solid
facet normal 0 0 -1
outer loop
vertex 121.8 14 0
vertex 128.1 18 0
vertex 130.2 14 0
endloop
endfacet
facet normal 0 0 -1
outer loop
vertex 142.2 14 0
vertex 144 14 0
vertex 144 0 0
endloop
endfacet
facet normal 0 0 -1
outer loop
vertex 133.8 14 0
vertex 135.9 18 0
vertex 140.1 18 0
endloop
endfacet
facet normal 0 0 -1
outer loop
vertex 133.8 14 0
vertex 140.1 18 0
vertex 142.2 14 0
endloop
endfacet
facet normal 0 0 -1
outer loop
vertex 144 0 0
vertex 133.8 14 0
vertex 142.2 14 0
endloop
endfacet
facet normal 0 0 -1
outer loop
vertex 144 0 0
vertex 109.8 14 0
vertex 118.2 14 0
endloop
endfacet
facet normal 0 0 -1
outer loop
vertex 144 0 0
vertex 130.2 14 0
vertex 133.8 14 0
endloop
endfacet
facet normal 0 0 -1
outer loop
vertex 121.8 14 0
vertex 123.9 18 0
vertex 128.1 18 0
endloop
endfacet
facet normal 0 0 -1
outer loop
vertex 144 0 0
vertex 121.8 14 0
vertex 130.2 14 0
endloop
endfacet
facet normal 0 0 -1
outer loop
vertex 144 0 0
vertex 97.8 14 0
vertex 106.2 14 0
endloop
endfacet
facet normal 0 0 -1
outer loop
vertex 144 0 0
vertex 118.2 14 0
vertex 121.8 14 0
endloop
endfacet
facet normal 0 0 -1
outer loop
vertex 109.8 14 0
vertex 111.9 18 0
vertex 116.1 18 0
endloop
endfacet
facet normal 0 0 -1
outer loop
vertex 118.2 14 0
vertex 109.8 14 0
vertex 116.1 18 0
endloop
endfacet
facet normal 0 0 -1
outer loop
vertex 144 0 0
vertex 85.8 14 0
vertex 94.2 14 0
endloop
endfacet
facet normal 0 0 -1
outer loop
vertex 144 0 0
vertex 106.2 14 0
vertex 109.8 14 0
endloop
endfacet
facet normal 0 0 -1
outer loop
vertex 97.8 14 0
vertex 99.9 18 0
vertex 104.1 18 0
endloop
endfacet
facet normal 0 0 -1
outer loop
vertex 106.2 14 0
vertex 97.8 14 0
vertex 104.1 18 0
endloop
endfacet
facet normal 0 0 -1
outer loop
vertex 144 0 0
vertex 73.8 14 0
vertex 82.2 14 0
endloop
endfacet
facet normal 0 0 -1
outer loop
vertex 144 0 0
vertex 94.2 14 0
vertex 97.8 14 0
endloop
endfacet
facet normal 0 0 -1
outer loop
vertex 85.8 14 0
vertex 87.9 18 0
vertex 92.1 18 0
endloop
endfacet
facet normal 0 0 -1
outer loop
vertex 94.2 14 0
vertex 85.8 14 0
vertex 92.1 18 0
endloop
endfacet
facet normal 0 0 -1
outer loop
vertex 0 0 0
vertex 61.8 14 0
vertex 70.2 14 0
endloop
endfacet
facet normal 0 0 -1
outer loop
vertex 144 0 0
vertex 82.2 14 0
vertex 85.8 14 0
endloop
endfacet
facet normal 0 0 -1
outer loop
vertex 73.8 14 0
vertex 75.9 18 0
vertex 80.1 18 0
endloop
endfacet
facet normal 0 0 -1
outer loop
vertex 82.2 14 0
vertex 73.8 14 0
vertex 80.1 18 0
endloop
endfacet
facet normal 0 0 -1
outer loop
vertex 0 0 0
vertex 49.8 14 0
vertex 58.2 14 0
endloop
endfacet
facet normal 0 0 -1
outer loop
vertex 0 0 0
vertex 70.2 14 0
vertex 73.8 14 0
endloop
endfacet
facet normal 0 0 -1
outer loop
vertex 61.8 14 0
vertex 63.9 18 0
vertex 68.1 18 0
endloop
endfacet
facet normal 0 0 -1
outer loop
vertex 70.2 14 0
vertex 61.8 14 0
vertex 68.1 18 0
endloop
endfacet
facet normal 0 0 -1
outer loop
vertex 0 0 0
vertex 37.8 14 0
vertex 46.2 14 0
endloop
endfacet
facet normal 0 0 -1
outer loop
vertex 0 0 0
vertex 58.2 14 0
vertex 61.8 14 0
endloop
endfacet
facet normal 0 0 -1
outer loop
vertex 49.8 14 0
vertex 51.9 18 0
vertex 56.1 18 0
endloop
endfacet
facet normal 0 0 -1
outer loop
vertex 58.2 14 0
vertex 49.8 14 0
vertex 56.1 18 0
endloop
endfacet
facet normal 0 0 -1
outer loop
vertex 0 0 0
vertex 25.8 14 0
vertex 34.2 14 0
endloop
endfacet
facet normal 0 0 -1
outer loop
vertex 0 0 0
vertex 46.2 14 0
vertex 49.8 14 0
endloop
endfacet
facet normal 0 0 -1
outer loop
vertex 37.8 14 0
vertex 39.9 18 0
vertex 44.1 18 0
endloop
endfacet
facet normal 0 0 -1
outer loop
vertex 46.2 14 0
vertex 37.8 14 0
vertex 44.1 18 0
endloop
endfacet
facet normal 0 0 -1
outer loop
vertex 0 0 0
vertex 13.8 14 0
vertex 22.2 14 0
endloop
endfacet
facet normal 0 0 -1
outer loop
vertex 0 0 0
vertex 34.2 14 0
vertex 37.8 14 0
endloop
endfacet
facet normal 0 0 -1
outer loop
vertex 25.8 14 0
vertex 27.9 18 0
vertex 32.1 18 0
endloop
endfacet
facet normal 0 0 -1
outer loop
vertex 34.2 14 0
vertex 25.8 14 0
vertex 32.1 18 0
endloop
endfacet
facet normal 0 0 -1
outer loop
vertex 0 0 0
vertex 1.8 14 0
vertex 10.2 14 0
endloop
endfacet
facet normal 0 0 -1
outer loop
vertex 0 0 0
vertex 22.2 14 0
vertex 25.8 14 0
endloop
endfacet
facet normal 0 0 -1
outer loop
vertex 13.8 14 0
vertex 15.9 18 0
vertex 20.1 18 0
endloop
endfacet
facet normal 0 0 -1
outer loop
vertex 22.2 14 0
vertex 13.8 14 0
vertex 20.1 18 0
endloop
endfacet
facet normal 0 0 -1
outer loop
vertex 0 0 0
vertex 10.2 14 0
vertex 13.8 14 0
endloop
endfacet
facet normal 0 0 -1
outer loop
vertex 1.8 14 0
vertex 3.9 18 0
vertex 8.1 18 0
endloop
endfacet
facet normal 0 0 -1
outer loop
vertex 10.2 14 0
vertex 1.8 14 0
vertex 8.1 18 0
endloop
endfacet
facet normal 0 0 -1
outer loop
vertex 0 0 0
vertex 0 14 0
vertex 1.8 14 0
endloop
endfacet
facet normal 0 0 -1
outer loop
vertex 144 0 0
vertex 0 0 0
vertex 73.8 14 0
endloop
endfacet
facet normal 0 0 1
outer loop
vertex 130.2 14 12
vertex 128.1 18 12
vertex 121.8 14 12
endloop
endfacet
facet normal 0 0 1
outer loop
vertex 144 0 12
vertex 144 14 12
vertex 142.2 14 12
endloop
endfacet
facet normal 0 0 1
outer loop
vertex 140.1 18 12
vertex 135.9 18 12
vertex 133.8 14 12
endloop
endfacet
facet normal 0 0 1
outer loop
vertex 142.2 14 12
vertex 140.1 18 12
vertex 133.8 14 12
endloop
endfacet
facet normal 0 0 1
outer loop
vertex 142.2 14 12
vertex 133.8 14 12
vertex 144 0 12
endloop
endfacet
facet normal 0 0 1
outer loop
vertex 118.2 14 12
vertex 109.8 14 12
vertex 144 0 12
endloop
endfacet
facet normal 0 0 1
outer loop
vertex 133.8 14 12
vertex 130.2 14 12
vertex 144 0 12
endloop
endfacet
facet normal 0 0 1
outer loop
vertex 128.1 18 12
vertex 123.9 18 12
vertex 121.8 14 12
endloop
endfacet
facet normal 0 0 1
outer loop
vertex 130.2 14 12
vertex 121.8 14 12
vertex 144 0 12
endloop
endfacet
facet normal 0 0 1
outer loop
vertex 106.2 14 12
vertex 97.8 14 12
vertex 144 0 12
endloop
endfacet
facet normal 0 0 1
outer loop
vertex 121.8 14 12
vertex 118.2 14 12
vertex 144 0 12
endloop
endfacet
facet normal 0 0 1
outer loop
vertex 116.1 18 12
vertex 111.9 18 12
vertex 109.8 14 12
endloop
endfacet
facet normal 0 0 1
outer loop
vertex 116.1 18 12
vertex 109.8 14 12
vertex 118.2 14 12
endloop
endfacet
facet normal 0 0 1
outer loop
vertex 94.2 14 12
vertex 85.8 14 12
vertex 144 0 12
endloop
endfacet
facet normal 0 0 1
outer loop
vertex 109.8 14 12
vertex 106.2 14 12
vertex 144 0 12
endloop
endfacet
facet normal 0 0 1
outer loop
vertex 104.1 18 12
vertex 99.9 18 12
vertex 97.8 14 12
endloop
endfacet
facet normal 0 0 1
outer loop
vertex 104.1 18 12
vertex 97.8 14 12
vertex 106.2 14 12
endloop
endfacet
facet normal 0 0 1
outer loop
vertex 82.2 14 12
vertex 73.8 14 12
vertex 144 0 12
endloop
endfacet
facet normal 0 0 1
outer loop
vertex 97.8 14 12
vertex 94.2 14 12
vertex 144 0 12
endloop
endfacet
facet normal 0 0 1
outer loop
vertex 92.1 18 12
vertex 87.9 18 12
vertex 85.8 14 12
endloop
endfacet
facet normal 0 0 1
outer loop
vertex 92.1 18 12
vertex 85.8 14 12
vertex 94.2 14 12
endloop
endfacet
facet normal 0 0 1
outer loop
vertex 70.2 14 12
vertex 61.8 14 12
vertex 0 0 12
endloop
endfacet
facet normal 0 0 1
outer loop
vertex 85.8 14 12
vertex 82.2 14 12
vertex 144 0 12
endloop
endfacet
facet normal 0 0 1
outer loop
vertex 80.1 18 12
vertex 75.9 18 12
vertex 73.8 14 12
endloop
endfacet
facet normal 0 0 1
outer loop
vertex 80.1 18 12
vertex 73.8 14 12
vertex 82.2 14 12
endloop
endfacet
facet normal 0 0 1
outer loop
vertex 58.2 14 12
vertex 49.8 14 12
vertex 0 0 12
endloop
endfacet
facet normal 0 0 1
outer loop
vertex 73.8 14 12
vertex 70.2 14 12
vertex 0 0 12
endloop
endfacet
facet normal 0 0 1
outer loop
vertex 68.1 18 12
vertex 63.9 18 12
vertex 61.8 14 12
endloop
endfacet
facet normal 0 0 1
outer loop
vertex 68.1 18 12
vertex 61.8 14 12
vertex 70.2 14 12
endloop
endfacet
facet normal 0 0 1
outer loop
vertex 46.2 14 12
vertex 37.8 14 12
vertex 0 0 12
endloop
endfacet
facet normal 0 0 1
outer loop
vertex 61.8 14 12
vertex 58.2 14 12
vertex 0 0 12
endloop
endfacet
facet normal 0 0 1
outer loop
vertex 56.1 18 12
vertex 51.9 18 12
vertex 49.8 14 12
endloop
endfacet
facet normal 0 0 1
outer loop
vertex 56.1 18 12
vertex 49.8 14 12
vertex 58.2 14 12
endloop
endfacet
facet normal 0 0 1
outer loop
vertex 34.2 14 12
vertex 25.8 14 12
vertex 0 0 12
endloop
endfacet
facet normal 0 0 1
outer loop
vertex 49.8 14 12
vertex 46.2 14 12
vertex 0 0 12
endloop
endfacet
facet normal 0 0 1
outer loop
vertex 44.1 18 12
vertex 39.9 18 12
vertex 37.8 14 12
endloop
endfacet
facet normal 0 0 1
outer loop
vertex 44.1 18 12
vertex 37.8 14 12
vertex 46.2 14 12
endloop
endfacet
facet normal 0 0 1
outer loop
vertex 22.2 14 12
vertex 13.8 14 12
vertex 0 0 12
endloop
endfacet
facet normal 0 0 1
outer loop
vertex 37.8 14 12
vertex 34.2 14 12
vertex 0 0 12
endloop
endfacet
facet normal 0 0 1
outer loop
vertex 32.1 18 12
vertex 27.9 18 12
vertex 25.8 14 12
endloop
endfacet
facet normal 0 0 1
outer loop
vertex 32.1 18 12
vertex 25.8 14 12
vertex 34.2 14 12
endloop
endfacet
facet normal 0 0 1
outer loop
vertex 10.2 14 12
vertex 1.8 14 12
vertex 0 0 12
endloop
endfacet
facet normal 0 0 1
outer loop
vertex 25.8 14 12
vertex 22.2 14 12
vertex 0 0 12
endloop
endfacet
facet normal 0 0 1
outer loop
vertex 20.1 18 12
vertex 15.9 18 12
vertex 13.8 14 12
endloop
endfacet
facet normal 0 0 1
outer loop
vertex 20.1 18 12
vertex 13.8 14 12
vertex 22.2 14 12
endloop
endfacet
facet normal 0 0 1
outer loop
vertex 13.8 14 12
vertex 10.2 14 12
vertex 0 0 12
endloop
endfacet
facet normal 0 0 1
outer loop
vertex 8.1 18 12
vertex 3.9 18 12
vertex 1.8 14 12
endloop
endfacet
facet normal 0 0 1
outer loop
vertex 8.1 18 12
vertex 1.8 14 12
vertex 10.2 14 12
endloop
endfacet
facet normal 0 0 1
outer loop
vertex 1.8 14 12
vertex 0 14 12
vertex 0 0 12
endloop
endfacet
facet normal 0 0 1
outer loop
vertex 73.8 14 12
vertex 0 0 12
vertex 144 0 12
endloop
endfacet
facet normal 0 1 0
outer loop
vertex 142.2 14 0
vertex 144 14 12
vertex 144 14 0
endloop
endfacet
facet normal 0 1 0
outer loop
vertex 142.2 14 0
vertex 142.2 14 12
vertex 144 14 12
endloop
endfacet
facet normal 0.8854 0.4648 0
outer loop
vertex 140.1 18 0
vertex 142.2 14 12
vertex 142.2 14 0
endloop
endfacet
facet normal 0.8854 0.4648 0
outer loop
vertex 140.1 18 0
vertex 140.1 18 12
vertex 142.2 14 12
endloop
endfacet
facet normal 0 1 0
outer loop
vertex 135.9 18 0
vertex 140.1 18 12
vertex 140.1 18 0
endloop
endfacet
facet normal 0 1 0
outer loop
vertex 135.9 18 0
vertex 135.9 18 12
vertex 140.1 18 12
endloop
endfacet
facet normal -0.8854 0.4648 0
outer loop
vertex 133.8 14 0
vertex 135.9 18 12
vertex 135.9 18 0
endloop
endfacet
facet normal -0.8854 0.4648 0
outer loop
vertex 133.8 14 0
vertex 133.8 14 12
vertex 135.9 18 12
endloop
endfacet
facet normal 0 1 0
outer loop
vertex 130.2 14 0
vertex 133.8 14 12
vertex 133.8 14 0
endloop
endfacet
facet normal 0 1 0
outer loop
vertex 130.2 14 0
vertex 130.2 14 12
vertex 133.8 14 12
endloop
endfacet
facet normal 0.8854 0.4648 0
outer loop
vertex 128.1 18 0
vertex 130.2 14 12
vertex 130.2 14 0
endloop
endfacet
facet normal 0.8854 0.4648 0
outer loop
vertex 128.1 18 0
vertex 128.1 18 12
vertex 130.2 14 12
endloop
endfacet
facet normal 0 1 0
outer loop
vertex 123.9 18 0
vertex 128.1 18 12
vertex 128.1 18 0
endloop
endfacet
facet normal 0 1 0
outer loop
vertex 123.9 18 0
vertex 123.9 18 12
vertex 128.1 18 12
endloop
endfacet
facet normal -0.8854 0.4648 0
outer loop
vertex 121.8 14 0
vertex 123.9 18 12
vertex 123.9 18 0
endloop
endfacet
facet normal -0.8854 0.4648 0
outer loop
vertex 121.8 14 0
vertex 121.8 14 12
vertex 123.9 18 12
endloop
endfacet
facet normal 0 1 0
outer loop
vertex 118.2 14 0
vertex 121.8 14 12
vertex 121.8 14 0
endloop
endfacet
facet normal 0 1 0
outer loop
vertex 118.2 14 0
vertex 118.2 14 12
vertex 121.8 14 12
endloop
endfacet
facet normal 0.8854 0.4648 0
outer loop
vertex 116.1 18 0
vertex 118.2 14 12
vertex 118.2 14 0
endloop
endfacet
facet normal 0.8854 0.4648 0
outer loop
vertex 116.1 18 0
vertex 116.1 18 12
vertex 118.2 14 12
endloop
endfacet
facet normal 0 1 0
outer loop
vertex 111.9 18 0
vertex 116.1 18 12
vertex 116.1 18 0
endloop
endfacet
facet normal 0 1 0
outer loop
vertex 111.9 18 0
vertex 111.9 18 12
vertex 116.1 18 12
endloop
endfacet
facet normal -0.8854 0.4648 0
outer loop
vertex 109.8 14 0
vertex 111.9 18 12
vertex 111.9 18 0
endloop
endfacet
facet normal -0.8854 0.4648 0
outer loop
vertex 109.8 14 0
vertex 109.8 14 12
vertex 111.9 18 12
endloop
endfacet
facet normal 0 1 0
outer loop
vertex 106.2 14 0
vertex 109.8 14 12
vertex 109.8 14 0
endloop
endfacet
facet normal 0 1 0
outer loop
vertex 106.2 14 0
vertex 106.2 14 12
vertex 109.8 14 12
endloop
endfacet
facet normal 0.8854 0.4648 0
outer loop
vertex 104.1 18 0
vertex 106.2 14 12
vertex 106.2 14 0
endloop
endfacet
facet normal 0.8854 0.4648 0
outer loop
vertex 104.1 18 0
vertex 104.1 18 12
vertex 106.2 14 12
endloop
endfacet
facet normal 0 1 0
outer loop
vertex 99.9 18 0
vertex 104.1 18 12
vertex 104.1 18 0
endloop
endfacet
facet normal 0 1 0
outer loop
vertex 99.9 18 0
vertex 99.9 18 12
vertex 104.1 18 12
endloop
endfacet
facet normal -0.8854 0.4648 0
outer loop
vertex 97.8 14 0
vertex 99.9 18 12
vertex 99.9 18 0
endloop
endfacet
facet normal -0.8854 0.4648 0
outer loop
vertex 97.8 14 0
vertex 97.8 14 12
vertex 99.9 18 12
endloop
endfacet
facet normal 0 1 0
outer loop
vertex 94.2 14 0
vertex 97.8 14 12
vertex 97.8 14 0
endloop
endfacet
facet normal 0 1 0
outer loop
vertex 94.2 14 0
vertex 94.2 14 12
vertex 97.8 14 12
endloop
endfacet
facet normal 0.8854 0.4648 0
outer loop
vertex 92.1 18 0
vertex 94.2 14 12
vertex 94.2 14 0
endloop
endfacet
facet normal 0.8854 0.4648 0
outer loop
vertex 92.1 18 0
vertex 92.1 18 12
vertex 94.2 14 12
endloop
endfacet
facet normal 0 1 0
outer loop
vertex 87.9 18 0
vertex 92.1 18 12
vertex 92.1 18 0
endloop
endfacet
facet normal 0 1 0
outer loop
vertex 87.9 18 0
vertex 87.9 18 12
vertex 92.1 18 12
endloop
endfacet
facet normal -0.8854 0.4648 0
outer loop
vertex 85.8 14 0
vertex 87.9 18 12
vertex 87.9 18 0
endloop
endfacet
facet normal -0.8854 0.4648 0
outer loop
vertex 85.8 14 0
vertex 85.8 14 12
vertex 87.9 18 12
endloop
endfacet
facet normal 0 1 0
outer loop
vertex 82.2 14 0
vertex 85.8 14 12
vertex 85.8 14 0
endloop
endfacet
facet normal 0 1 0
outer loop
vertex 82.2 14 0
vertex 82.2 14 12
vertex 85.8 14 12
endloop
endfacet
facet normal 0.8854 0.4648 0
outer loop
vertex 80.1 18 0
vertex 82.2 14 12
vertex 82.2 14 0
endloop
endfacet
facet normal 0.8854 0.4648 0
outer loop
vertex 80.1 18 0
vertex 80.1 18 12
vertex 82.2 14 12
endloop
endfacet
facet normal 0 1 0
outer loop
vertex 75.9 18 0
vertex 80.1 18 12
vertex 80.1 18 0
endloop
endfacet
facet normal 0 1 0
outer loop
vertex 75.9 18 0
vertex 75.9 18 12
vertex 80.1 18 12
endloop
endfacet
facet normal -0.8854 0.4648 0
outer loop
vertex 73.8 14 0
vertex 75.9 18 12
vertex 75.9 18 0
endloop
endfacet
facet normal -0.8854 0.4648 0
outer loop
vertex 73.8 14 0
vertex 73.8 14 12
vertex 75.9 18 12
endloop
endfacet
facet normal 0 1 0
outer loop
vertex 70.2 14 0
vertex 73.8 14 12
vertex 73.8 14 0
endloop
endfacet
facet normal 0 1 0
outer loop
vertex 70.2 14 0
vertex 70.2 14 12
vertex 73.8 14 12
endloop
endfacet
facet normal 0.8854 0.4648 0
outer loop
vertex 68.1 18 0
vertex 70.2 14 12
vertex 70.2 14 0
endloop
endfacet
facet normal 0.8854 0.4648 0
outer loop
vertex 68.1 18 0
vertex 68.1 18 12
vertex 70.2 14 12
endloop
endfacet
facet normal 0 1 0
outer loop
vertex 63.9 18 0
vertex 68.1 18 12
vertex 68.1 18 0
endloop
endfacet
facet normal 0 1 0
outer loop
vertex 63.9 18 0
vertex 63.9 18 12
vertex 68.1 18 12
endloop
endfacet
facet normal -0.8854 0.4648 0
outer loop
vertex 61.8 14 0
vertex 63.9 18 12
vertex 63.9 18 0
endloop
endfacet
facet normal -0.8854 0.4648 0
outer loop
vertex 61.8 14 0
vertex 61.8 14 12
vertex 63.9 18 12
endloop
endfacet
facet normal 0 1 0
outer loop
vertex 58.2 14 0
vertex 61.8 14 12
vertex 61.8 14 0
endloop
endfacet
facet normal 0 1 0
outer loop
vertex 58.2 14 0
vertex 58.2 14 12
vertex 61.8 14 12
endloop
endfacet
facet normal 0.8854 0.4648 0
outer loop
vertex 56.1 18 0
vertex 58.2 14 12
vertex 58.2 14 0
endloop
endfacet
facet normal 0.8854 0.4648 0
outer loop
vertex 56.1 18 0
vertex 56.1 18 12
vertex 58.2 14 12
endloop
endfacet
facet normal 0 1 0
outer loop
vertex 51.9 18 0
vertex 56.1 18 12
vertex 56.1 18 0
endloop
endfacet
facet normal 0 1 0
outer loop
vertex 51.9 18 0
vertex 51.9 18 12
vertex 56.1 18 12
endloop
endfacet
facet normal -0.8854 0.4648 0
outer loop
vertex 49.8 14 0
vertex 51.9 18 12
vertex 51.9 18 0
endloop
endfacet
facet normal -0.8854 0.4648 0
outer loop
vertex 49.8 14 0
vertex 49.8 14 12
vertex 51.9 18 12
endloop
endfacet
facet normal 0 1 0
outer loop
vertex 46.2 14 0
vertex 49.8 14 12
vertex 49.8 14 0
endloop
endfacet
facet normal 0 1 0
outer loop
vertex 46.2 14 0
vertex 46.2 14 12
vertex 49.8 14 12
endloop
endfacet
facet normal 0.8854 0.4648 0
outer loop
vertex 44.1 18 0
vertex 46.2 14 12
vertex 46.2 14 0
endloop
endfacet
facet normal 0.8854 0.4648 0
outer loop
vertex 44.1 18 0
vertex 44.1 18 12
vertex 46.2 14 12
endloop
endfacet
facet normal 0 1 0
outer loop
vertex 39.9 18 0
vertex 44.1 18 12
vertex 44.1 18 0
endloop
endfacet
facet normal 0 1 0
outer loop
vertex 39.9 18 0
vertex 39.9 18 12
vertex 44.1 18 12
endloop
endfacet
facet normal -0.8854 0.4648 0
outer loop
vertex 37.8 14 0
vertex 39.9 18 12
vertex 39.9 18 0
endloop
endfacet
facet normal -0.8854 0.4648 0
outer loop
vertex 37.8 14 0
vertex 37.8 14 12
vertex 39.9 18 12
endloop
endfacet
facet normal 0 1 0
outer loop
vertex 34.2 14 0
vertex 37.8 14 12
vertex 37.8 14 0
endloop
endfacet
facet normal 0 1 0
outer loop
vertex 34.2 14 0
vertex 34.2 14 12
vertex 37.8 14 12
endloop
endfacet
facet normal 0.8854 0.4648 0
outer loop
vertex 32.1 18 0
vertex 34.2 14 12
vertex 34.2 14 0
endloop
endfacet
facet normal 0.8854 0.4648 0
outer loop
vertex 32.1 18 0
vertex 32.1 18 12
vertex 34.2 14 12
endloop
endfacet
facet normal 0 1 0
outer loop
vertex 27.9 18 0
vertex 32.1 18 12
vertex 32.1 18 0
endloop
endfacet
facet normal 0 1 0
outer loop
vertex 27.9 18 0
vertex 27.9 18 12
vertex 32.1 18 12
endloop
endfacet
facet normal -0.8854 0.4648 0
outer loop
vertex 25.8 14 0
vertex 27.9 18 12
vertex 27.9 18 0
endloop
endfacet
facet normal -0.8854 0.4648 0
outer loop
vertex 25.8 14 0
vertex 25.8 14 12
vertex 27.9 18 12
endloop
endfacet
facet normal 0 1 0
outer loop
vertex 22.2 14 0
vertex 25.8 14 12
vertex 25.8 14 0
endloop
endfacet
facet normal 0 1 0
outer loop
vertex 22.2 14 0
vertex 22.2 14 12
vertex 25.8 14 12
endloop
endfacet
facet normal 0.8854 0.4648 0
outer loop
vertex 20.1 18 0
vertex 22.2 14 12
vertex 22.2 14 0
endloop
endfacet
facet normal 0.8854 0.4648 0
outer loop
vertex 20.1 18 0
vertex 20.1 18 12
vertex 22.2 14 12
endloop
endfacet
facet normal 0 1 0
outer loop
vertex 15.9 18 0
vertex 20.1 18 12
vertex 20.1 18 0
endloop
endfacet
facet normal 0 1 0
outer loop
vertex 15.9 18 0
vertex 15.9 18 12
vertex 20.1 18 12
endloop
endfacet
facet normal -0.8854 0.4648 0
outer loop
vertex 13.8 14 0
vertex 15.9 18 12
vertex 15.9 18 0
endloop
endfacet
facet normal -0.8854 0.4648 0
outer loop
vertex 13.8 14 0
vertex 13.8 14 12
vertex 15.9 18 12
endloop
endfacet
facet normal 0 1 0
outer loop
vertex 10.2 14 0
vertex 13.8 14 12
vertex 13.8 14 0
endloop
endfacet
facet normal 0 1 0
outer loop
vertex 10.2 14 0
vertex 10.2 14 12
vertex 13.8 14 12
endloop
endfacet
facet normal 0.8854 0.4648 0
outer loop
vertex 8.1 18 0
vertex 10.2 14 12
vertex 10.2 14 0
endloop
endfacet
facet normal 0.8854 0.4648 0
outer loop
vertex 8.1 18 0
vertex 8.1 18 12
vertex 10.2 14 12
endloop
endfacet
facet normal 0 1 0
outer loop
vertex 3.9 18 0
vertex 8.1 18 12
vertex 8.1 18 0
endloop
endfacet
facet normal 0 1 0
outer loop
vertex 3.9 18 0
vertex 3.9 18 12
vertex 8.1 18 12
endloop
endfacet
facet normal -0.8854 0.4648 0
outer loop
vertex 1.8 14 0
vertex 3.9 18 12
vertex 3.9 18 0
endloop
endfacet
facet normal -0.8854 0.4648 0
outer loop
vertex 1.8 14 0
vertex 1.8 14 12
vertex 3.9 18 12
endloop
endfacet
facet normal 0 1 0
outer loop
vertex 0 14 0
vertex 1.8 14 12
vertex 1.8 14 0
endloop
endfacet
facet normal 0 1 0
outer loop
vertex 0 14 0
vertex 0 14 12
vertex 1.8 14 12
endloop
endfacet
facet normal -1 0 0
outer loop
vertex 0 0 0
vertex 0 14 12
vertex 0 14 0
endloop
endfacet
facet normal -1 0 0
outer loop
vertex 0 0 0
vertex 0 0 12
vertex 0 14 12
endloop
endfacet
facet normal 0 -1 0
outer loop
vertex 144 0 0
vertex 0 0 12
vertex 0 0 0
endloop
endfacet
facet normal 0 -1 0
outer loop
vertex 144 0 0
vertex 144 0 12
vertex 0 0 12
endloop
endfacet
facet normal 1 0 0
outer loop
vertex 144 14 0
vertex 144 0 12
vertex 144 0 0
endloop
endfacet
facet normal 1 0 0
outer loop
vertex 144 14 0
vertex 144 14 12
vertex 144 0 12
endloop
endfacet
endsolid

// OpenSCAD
$fn = 32;

// ----------------------------------------------------------------------
// Gear rack: 12 teeth, pitch 12 mm
// ----------------------------------------------------------------------

// --- parameters (mm) ---
teeth = 12;               // number of teeth
pitch = 12;               // tooth pitch, X
root_w = 8.4;             // tooth width at the root
tip_w = 4.2;              // tooth width at the tip
base_h = 14;              // rack body height, Y
tooth_h = 4;              // tooth height above the body
plate_t = 12;             // rack width, Z (extrusion height)

rack_l = teeth * pitch;  // overall length
total_h = base_h + tooth_h;  // overall height

profile = [[0, 0], [144, 0], [144, 14], [142.2, 14], [140.1, 18], [135.9, 18], [133.8, 14], [130.2, 14], [128.1, 18], [123.9, 18], [121.8, 14], [118.2, 14], [116.1, 18], [111.9, 18], [109.8, 14], [106.2, 14], [104.1, 18], [99.9, 18], [97.8, 14], [94.2, 14], [92.1, 18], [87.9, 18], [85.8, 14], [82.2, 14], [80.1, 18], [75.9, 18], [73.8, 14], [70.2, 14], [68.1, 18], [63.9, 18], [61.8, 14], [58.2, 14], [56.1, 18], [51.9, 18], [49.8, 14], [46.2, 14], [44.1, 18], [39.9, 18], [37.8, 14], [34.2, 14], [32.1, 18], [27.9, 18], [25.8, 14], [22.2, 14], [20.1, 18], [15.9, 18], [13.8, 14], [10.2, 14], [8.1, 18], [3.9, 18], [1.8, 14], [0, 14]];  // primary outline, 52 points, counter clockwise

// --- the one profile operation ---
linear_extrude(height = plate_t) polygon(points = profile);
